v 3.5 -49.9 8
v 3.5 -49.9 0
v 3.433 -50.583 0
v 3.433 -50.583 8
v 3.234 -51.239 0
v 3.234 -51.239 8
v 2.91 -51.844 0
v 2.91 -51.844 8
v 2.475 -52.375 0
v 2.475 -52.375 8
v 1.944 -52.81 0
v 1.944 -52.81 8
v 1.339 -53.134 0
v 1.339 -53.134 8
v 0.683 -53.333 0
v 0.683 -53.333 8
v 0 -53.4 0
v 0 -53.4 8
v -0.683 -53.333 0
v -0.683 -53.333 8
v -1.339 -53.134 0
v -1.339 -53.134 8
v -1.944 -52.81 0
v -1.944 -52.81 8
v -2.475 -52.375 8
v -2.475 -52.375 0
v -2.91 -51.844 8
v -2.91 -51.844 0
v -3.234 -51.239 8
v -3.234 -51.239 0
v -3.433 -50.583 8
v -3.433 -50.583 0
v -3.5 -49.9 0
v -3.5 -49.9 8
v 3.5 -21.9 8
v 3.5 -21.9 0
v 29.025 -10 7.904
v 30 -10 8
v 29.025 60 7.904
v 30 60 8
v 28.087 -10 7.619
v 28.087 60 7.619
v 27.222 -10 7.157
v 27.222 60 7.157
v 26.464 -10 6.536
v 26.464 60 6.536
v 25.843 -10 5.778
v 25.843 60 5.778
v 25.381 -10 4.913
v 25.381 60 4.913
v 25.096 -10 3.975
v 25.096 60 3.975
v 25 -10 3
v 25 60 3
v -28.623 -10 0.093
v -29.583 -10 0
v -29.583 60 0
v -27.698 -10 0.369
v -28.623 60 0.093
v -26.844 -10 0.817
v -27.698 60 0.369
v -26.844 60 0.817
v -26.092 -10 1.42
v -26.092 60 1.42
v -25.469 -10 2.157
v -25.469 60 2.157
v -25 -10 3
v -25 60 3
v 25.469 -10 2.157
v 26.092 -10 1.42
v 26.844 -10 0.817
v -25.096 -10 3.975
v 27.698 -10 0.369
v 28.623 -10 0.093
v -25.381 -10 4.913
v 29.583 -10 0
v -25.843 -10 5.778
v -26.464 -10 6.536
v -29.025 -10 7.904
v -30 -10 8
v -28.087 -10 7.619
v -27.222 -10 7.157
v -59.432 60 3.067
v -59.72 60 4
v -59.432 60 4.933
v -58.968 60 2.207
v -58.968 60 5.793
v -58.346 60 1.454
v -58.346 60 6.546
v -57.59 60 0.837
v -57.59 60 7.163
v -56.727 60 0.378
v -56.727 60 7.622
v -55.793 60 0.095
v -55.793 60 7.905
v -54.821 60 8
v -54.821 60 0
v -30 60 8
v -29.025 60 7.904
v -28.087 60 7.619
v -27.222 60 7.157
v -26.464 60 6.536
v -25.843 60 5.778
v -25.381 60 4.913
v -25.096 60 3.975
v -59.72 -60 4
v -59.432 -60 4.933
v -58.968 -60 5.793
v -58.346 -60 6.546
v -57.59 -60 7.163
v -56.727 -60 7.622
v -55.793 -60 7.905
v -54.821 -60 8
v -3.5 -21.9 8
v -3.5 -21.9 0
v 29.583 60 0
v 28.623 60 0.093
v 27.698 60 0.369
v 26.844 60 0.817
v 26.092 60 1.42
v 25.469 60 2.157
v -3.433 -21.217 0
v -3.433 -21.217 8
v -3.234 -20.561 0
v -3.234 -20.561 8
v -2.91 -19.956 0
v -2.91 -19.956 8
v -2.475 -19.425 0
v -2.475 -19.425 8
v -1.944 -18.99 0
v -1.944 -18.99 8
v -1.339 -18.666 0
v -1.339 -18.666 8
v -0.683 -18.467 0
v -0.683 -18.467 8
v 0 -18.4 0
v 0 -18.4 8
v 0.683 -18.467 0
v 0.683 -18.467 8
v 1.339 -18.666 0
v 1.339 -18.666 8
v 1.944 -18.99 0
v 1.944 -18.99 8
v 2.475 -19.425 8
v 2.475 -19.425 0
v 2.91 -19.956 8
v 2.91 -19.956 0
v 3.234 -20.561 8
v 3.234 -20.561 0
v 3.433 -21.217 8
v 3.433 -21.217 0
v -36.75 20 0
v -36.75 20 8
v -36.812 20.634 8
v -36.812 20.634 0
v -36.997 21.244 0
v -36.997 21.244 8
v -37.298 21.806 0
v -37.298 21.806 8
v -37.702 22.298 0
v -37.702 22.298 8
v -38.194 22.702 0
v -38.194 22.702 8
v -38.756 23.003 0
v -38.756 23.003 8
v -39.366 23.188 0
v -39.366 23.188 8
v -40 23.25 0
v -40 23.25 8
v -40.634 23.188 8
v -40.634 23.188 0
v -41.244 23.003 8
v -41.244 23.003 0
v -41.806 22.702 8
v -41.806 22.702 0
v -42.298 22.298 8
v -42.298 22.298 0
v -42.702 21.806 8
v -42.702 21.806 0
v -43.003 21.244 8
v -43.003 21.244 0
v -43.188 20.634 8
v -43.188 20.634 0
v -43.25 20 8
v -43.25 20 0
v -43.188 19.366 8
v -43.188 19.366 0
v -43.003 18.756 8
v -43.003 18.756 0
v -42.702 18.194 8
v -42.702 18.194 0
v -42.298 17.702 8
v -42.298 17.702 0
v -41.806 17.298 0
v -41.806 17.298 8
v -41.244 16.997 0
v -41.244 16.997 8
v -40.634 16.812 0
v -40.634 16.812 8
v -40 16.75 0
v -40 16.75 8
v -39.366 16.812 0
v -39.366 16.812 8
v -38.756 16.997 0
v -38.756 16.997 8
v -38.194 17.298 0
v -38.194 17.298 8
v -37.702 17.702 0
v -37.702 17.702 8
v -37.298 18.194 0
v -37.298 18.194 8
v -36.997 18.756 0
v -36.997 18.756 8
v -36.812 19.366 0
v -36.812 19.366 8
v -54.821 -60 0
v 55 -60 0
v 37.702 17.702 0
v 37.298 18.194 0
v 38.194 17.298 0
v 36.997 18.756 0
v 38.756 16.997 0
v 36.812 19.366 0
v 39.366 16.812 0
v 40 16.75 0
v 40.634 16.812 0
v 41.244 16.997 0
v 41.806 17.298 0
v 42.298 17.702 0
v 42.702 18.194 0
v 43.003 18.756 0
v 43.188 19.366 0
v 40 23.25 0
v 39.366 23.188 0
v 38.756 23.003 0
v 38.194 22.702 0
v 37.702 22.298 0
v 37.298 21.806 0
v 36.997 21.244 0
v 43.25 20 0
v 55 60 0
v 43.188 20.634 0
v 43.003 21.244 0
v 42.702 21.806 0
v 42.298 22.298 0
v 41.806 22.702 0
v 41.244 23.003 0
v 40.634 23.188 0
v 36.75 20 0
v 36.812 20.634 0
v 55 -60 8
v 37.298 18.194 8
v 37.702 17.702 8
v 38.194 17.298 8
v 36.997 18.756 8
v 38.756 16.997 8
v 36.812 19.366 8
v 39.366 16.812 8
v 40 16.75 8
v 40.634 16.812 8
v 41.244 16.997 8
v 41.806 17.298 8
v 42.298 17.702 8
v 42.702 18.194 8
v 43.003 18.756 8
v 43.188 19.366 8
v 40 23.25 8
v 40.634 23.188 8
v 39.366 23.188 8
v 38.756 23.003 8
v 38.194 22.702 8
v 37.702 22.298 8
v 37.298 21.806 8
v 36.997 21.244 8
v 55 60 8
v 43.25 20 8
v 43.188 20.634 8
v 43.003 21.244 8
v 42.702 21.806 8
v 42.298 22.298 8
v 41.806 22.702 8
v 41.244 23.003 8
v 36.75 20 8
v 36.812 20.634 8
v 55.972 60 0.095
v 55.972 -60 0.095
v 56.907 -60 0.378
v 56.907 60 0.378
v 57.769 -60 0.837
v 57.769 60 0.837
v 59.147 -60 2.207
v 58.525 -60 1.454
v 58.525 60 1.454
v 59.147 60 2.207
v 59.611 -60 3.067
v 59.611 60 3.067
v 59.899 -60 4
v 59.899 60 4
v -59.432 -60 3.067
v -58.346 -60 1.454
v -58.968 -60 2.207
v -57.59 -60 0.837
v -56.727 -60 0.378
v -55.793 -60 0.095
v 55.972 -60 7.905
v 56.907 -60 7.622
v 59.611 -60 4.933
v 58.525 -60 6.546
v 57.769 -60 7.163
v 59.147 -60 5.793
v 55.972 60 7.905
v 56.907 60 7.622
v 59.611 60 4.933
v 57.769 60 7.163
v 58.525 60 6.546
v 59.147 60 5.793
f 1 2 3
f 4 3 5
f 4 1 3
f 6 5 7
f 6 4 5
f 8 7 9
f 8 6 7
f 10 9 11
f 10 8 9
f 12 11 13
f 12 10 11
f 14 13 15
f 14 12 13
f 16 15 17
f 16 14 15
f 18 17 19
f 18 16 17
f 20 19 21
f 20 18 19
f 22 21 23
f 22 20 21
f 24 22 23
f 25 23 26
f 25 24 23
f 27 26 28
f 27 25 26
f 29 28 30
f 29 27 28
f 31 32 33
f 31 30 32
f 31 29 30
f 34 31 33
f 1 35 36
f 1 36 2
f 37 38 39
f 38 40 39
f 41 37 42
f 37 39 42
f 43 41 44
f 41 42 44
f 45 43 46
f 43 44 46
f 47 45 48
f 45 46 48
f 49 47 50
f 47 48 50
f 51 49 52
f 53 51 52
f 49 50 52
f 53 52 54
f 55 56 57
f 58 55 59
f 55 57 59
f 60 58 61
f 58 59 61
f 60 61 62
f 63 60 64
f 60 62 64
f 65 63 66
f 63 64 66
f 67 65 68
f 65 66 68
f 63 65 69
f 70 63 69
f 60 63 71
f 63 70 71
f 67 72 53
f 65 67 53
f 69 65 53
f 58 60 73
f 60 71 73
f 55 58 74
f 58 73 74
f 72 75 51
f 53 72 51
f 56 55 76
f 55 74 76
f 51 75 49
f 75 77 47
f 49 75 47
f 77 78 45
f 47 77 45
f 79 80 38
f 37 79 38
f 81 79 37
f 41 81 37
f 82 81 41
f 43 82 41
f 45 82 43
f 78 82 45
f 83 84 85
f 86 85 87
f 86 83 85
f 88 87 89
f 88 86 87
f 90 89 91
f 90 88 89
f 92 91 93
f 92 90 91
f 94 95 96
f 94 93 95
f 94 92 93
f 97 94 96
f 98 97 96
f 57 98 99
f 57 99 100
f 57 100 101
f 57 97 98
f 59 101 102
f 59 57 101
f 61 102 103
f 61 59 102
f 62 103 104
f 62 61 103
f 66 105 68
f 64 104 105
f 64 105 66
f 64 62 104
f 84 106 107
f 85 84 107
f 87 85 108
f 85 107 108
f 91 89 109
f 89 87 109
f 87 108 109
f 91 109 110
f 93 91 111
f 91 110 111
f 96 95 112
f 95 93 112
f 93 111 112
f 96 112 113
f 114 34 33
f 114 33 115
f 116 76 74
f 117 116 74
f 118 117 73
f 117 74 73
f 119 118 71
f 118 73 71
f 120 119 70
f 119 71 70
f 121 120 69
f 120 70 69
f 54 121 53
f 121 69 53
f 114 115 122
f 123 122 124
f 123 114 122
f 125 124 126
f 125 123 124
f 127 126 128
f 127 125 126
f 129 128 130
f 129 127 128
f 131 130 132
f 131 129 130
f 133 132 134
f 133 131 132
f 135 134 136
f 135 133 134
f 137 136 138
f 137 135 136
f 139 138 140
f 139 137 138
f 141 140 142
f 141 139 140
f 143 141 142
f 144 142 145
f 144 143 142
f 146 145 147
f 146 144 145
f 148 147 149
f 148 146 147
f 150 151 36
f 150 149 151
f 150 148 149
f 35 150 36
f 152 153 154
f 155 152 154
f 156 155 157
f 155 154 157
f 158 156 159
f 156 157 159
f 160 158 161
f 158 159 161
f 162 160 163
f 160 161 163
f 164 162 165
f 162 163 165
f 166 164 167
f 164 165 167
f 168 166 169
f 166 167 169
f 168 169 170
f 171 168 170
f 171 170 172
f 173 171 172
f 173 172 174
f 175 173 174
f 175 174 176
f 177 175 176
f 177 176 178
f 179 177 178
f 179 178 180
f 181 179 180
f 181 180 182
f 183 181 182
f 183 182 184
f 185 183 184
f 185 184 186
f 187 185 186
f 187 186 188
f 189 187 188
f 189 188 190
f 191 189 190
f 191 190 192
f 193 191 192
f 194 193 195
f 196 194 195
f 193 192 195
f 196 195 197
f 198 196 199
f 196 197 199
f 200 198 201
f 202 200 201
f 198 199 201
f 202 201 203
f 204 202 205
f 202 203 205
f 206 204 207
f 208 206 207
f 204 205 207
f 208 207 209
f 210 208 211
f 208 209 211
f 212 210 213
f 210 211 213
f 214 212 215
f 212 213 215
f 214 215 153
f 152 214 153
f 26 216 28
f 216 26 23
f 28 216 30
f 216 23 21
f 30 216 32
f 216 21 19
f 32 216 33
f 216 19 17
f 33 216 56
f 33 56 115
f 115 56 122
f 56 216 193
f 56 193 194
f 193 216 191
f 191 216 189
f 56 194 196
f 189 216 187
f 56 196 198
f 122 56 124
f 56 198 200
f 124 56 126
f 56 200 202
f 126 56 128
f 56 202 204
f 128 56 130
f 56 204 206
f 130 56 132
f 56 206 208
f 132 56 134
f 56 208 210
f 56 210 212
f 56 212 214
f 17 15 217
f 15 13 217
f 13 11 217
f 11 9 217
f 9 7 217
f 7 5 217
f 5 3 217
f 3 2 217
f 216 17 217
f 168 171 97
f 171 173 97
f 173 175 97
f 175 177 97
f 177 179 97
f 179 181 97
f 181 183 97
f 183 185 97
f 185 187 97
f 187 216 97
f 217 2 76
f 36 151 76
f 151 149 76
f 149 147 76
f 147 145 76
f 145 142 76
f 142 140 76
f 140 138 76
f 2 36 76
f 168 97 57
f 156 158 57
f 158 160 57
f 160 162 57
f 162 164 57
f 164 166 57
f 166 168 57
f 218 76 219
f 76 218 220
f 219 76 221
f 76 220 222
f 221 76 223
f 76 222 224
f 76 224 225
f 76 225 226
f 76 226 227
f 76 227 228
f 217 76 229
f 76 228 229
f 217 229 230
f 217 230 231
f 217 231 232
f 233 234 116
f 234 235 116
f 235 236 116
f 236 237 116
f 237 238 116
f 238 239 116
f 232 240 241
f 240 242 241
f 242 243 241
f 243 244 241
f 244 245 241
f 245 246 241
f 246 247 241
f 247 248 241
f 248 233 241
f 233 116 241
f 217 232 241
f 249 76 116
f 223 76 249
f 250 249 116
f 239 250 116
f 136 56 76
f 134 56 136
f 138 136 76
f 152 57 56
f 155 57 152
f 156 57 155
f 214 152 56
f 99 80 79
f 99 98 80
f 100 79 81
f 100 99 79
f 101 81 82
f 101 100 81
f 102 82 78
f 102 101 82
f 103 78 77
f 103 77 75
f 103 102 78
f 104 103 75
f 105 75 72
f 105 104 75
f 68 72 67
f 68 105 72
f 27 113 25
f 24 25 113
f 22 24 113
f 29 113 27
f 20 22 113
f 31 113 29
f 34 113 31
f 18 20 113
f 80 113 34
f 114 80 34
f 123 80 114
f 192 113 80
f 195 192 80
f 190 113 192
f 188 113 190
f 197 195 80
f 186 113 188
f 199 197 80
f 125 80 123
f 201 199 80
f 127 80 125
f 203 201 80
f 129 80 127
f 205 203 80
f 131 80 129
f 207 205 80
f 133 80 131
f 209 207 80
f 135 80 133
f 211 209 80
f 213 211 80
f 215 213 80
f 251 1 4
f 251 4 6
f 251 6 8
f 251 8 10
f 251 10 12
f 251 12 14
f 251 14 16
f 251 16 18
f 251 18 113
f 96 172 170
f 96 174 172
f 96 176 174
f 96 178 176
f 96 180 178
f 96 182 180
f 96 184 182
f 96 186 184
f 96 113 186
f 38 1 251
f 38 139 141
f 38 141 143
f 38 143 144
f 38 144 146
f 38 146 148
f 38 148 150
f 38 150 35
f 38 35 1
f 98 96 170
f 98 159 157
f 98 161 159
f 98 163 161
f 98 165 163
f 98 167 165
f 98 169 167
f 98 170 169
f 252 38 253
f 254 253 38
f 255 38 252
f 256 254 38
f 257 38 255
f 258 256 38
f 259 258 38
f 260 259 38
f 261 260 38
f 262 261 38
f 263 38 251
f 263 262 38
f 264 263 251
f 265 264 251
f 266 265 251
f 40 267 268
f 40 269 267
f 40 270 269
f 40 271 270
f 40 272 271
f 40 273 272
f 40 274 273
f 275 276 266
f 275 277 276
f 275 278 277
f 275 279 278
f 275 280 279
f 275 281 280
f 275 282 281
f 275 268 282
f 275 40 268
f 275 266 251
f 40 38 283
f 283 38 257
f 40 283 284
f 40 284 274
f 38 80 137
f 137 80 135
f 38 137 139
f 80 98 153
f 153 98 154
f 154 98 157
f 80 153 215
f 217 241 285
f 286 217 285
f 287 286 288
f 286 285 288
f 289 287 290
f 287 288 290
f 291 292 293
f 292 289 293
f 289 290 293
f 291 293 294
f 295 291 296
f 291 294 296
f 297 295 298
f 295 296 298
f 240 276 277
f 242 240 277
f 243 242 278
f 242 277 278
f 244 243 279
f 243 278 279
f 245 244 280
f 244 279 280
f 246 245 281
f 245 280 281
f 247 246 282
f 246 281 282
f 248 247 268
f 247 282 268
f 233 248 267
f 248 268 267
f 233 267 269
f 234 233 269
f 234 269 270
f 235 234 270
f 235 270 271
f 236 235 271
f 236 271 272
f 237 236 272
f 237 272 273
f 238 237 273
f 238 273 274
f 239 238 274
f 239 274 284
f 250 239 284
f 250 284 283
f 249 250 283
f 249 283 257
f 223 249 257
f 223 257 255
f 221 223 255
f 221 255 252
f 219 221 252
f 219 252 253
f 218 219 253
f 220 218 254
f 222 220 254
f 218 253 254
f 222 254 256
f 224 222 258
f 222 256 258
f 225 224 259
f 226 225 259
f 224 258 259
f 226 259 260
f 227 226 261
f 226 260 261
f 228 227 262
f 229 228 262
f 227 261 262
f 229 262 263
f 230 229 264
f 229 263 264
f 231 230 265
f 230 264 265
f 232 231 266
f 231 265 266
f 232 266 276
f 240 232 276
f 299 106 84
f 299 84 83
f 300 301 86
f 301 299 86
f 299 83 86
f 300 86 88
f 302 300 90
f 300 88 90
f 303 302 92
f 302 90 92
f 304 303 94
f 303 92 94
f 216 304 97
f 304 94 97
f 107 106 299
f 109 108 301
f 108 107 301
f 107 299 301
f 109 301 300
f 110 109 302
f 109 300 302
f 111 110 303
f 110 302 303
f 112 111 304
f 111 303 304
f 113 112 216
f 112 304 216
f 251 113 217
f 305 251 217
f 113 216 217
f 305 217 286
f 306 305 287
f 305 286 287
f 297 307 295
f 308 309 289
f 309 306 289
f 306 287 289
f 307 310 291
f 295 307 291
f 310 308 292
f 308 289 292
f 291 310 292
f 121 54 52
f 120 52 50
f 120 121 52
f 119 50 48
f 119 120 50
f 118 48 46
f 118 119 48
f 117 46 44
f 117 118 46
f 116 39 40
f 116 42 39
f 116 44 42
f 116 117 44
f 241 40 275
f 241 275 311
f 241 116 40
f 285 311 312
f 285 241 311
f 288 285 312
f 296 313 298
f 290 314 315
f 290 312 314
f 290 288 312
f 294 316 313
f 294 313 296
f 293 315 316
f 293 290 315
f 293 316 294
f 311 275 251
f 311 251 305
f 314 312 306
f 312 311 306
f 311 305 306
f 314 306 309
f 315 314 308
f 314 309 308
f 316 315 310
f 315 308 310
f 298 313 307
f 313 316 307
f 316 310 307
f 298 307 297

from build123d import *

# Parameters (mm, degrees)
SKETCH1_W           = 140
SKETCH1_H           = 120
BOSS_EXTRUDE1_DEPTH = 8
SKETCH2_R           = 3.25
CUT_EXTRUDE1_DEPTH  = 93.54188241
CUT_EXTRUDE2_DEPTH  = 93.54188241
SKETCH5_W           = 50
SKETCH5_H           = 70
CUT_EXTRUDE3_DEPTH  = 93.54188241
FILLET2_R           = 5
FILLET3_R           = 5
SKETCH6_W           = 10.179307593
SKETCH6_H           = 120.009276429
SKETCH6_W_2         = 10
SKETCH6_H_2         = 120
CUT_EXTRUDE4_DEPTH  = 93.54188241
FILLET4_R           = 5


with BuildPart() as part:
    # Sketch1 → Boss-Extrude1 (new body)
    with BuildSketch(Plane.XY):
        Rectangle(SKETCH1_W, SKETCH1_H)
    extrude(amount=BOSS_EXTRUDE1_DEPTH)

    # Sketch2 → Cut-Extrude1 (cut, through all)
    with BuildSketch(Plane.XY.offset(8)):
        with Locations((-40, 20)):
            Circle(SKETCH2_R)
        with Locations((40, 20)):
            Circle(SKETCH2_R)
    extrude(amount=-CUT_EXTRUDE1_DEPTH, mode=Mode.SUBTRACT)

    # Sketch3 → Cut-Extrude2 (cut, through all)
    with BuildSketch(Plane.XY.offset(8)):
        with BuildLine():
            Line((-3.5, -49.9), (-3.5, -21.9))
            ThreePointArc((-3.5, -21.9), (0, -18.4), (3.5, -21.9))
            Line((3.5, -21.9), (3.5, -49.9))
            ThreePointArc((3.5, -49.9), (0, -53.4), (-3.5, -49.9))
        make_face()
    extrude(amount=-CUT_EXTRUDE2_DEPTH, mode=Mode.SUBTRACT)

    # Sketch5 → Cut-Extrude3 (cut, through all)
    with BuildSketch(Plane.XY.offset(8)):
        with Locations((0, 25)):
            Rectangle(SKETCH5_W, SKETCH5_H)
    extrude(amount=-CUT_EXTRUDE3_DEPTH, mode=Mode.SUBTRACT)

    # Fillet2
    fillet2_edges = [part.edges().sort_by_distance(p)[0] for p in [
        (-25, 25, 8),
        (25, 25, 8),
    ]]
    fillet(fillet2_edges, radius=FILLET2_R)

    # Fillet3
    # the kernel refuses this fillet: 5 mm, written as the material it takes off along each edge
    with BuildSketch(Plane(origin=(25, -10, 0), x_dir=(1, 0, 0), z_dir=(0, 1, 0)), Plane(origin=(-25, 71.456439237, 0), x_dir=(-1, 0, 0), z_dir=(0, -1, 0))) as fillet3_piece_1:
        with BuildLine():
            CenterArc((4.582575695, -5), FILLET3_R, 90, 66.421821522)
            Line((0, -3), (-0.091651514, -2.96))
            ThreePointArc((-0.091651514, -2.96), (-0.1, -1.5), (-0.1, 0))
            Line((-0.1, 0), (0, 0.1))
            Line((0, 0.1), (4.582575695, 0.1))
            Line((4.582575695, 0.1), (4.582575695, 0))
        make_face()
    extrude(amount=81.456439237, mode=Mode.SUBTRACT)

    # Sketch6 → Cut-Extrude4 (cut, through all)
    with BuildSketch(Plane.XY.offset(8)):
        with Locations((-64.910346203, 0.004638214)):
            Rectangle(SKETCH6_W, SKETCH6_H)
        with Locations((65, 0)):
            Rectangle(SKETCH6_W_2, SKETCH6_H_2)
    extrude(amount=-CUT_EXTRUDE4_DEPTH, mode=Mode.SUBTRACT)

    # Fillet4
    # the kernel refuses this fillet: 5 mm, written as the material it takes off along each edge
    with BuildSketch(Plane(origin=(60, 72.5, 0), x_dir=(0, 0, 1), z_dir=(0, -1, 0)), Plane(origin=(-59.820692407, -72.5, 8), x_dir=(1, 0, 0), z_dir=(0, 1, 0))) as fillet4_piece_1:
        with BuildLine():
            CenterArc((FILLET4_R, FILLET4_R), FILLET4_R, 180, 90)
            Line((0, FILLET4_R), (0, 0))
            Line((0, 0), (FILLET4_R, 0))
        make_face()
    extrude(amount=145, mode=Mode.SUBTRACT)
    with BuildSketch(Plane(origin=(60, -72.5, 8), x_dir=(-1, 0, 0), z_dir=(0, 1, 0)), Plane(origin=(-59.820692407, 72.5, 0), x_dir=(0, 0, 1), z_dir=(0, -1, 0))) as fillet4_piece_2:
        with BuildLine():
            CenterArc((FILLET4_R, -FILLET4_R), FILLET4_R, 90, 90)
            Line((0, -FILLET4_R), (0, 0))
            Line((0, 0), (FILLET4_R, 0))
        make_face()
    extrude(amount=145, mode=Mode.SUBTRACT)


solid = part.part
